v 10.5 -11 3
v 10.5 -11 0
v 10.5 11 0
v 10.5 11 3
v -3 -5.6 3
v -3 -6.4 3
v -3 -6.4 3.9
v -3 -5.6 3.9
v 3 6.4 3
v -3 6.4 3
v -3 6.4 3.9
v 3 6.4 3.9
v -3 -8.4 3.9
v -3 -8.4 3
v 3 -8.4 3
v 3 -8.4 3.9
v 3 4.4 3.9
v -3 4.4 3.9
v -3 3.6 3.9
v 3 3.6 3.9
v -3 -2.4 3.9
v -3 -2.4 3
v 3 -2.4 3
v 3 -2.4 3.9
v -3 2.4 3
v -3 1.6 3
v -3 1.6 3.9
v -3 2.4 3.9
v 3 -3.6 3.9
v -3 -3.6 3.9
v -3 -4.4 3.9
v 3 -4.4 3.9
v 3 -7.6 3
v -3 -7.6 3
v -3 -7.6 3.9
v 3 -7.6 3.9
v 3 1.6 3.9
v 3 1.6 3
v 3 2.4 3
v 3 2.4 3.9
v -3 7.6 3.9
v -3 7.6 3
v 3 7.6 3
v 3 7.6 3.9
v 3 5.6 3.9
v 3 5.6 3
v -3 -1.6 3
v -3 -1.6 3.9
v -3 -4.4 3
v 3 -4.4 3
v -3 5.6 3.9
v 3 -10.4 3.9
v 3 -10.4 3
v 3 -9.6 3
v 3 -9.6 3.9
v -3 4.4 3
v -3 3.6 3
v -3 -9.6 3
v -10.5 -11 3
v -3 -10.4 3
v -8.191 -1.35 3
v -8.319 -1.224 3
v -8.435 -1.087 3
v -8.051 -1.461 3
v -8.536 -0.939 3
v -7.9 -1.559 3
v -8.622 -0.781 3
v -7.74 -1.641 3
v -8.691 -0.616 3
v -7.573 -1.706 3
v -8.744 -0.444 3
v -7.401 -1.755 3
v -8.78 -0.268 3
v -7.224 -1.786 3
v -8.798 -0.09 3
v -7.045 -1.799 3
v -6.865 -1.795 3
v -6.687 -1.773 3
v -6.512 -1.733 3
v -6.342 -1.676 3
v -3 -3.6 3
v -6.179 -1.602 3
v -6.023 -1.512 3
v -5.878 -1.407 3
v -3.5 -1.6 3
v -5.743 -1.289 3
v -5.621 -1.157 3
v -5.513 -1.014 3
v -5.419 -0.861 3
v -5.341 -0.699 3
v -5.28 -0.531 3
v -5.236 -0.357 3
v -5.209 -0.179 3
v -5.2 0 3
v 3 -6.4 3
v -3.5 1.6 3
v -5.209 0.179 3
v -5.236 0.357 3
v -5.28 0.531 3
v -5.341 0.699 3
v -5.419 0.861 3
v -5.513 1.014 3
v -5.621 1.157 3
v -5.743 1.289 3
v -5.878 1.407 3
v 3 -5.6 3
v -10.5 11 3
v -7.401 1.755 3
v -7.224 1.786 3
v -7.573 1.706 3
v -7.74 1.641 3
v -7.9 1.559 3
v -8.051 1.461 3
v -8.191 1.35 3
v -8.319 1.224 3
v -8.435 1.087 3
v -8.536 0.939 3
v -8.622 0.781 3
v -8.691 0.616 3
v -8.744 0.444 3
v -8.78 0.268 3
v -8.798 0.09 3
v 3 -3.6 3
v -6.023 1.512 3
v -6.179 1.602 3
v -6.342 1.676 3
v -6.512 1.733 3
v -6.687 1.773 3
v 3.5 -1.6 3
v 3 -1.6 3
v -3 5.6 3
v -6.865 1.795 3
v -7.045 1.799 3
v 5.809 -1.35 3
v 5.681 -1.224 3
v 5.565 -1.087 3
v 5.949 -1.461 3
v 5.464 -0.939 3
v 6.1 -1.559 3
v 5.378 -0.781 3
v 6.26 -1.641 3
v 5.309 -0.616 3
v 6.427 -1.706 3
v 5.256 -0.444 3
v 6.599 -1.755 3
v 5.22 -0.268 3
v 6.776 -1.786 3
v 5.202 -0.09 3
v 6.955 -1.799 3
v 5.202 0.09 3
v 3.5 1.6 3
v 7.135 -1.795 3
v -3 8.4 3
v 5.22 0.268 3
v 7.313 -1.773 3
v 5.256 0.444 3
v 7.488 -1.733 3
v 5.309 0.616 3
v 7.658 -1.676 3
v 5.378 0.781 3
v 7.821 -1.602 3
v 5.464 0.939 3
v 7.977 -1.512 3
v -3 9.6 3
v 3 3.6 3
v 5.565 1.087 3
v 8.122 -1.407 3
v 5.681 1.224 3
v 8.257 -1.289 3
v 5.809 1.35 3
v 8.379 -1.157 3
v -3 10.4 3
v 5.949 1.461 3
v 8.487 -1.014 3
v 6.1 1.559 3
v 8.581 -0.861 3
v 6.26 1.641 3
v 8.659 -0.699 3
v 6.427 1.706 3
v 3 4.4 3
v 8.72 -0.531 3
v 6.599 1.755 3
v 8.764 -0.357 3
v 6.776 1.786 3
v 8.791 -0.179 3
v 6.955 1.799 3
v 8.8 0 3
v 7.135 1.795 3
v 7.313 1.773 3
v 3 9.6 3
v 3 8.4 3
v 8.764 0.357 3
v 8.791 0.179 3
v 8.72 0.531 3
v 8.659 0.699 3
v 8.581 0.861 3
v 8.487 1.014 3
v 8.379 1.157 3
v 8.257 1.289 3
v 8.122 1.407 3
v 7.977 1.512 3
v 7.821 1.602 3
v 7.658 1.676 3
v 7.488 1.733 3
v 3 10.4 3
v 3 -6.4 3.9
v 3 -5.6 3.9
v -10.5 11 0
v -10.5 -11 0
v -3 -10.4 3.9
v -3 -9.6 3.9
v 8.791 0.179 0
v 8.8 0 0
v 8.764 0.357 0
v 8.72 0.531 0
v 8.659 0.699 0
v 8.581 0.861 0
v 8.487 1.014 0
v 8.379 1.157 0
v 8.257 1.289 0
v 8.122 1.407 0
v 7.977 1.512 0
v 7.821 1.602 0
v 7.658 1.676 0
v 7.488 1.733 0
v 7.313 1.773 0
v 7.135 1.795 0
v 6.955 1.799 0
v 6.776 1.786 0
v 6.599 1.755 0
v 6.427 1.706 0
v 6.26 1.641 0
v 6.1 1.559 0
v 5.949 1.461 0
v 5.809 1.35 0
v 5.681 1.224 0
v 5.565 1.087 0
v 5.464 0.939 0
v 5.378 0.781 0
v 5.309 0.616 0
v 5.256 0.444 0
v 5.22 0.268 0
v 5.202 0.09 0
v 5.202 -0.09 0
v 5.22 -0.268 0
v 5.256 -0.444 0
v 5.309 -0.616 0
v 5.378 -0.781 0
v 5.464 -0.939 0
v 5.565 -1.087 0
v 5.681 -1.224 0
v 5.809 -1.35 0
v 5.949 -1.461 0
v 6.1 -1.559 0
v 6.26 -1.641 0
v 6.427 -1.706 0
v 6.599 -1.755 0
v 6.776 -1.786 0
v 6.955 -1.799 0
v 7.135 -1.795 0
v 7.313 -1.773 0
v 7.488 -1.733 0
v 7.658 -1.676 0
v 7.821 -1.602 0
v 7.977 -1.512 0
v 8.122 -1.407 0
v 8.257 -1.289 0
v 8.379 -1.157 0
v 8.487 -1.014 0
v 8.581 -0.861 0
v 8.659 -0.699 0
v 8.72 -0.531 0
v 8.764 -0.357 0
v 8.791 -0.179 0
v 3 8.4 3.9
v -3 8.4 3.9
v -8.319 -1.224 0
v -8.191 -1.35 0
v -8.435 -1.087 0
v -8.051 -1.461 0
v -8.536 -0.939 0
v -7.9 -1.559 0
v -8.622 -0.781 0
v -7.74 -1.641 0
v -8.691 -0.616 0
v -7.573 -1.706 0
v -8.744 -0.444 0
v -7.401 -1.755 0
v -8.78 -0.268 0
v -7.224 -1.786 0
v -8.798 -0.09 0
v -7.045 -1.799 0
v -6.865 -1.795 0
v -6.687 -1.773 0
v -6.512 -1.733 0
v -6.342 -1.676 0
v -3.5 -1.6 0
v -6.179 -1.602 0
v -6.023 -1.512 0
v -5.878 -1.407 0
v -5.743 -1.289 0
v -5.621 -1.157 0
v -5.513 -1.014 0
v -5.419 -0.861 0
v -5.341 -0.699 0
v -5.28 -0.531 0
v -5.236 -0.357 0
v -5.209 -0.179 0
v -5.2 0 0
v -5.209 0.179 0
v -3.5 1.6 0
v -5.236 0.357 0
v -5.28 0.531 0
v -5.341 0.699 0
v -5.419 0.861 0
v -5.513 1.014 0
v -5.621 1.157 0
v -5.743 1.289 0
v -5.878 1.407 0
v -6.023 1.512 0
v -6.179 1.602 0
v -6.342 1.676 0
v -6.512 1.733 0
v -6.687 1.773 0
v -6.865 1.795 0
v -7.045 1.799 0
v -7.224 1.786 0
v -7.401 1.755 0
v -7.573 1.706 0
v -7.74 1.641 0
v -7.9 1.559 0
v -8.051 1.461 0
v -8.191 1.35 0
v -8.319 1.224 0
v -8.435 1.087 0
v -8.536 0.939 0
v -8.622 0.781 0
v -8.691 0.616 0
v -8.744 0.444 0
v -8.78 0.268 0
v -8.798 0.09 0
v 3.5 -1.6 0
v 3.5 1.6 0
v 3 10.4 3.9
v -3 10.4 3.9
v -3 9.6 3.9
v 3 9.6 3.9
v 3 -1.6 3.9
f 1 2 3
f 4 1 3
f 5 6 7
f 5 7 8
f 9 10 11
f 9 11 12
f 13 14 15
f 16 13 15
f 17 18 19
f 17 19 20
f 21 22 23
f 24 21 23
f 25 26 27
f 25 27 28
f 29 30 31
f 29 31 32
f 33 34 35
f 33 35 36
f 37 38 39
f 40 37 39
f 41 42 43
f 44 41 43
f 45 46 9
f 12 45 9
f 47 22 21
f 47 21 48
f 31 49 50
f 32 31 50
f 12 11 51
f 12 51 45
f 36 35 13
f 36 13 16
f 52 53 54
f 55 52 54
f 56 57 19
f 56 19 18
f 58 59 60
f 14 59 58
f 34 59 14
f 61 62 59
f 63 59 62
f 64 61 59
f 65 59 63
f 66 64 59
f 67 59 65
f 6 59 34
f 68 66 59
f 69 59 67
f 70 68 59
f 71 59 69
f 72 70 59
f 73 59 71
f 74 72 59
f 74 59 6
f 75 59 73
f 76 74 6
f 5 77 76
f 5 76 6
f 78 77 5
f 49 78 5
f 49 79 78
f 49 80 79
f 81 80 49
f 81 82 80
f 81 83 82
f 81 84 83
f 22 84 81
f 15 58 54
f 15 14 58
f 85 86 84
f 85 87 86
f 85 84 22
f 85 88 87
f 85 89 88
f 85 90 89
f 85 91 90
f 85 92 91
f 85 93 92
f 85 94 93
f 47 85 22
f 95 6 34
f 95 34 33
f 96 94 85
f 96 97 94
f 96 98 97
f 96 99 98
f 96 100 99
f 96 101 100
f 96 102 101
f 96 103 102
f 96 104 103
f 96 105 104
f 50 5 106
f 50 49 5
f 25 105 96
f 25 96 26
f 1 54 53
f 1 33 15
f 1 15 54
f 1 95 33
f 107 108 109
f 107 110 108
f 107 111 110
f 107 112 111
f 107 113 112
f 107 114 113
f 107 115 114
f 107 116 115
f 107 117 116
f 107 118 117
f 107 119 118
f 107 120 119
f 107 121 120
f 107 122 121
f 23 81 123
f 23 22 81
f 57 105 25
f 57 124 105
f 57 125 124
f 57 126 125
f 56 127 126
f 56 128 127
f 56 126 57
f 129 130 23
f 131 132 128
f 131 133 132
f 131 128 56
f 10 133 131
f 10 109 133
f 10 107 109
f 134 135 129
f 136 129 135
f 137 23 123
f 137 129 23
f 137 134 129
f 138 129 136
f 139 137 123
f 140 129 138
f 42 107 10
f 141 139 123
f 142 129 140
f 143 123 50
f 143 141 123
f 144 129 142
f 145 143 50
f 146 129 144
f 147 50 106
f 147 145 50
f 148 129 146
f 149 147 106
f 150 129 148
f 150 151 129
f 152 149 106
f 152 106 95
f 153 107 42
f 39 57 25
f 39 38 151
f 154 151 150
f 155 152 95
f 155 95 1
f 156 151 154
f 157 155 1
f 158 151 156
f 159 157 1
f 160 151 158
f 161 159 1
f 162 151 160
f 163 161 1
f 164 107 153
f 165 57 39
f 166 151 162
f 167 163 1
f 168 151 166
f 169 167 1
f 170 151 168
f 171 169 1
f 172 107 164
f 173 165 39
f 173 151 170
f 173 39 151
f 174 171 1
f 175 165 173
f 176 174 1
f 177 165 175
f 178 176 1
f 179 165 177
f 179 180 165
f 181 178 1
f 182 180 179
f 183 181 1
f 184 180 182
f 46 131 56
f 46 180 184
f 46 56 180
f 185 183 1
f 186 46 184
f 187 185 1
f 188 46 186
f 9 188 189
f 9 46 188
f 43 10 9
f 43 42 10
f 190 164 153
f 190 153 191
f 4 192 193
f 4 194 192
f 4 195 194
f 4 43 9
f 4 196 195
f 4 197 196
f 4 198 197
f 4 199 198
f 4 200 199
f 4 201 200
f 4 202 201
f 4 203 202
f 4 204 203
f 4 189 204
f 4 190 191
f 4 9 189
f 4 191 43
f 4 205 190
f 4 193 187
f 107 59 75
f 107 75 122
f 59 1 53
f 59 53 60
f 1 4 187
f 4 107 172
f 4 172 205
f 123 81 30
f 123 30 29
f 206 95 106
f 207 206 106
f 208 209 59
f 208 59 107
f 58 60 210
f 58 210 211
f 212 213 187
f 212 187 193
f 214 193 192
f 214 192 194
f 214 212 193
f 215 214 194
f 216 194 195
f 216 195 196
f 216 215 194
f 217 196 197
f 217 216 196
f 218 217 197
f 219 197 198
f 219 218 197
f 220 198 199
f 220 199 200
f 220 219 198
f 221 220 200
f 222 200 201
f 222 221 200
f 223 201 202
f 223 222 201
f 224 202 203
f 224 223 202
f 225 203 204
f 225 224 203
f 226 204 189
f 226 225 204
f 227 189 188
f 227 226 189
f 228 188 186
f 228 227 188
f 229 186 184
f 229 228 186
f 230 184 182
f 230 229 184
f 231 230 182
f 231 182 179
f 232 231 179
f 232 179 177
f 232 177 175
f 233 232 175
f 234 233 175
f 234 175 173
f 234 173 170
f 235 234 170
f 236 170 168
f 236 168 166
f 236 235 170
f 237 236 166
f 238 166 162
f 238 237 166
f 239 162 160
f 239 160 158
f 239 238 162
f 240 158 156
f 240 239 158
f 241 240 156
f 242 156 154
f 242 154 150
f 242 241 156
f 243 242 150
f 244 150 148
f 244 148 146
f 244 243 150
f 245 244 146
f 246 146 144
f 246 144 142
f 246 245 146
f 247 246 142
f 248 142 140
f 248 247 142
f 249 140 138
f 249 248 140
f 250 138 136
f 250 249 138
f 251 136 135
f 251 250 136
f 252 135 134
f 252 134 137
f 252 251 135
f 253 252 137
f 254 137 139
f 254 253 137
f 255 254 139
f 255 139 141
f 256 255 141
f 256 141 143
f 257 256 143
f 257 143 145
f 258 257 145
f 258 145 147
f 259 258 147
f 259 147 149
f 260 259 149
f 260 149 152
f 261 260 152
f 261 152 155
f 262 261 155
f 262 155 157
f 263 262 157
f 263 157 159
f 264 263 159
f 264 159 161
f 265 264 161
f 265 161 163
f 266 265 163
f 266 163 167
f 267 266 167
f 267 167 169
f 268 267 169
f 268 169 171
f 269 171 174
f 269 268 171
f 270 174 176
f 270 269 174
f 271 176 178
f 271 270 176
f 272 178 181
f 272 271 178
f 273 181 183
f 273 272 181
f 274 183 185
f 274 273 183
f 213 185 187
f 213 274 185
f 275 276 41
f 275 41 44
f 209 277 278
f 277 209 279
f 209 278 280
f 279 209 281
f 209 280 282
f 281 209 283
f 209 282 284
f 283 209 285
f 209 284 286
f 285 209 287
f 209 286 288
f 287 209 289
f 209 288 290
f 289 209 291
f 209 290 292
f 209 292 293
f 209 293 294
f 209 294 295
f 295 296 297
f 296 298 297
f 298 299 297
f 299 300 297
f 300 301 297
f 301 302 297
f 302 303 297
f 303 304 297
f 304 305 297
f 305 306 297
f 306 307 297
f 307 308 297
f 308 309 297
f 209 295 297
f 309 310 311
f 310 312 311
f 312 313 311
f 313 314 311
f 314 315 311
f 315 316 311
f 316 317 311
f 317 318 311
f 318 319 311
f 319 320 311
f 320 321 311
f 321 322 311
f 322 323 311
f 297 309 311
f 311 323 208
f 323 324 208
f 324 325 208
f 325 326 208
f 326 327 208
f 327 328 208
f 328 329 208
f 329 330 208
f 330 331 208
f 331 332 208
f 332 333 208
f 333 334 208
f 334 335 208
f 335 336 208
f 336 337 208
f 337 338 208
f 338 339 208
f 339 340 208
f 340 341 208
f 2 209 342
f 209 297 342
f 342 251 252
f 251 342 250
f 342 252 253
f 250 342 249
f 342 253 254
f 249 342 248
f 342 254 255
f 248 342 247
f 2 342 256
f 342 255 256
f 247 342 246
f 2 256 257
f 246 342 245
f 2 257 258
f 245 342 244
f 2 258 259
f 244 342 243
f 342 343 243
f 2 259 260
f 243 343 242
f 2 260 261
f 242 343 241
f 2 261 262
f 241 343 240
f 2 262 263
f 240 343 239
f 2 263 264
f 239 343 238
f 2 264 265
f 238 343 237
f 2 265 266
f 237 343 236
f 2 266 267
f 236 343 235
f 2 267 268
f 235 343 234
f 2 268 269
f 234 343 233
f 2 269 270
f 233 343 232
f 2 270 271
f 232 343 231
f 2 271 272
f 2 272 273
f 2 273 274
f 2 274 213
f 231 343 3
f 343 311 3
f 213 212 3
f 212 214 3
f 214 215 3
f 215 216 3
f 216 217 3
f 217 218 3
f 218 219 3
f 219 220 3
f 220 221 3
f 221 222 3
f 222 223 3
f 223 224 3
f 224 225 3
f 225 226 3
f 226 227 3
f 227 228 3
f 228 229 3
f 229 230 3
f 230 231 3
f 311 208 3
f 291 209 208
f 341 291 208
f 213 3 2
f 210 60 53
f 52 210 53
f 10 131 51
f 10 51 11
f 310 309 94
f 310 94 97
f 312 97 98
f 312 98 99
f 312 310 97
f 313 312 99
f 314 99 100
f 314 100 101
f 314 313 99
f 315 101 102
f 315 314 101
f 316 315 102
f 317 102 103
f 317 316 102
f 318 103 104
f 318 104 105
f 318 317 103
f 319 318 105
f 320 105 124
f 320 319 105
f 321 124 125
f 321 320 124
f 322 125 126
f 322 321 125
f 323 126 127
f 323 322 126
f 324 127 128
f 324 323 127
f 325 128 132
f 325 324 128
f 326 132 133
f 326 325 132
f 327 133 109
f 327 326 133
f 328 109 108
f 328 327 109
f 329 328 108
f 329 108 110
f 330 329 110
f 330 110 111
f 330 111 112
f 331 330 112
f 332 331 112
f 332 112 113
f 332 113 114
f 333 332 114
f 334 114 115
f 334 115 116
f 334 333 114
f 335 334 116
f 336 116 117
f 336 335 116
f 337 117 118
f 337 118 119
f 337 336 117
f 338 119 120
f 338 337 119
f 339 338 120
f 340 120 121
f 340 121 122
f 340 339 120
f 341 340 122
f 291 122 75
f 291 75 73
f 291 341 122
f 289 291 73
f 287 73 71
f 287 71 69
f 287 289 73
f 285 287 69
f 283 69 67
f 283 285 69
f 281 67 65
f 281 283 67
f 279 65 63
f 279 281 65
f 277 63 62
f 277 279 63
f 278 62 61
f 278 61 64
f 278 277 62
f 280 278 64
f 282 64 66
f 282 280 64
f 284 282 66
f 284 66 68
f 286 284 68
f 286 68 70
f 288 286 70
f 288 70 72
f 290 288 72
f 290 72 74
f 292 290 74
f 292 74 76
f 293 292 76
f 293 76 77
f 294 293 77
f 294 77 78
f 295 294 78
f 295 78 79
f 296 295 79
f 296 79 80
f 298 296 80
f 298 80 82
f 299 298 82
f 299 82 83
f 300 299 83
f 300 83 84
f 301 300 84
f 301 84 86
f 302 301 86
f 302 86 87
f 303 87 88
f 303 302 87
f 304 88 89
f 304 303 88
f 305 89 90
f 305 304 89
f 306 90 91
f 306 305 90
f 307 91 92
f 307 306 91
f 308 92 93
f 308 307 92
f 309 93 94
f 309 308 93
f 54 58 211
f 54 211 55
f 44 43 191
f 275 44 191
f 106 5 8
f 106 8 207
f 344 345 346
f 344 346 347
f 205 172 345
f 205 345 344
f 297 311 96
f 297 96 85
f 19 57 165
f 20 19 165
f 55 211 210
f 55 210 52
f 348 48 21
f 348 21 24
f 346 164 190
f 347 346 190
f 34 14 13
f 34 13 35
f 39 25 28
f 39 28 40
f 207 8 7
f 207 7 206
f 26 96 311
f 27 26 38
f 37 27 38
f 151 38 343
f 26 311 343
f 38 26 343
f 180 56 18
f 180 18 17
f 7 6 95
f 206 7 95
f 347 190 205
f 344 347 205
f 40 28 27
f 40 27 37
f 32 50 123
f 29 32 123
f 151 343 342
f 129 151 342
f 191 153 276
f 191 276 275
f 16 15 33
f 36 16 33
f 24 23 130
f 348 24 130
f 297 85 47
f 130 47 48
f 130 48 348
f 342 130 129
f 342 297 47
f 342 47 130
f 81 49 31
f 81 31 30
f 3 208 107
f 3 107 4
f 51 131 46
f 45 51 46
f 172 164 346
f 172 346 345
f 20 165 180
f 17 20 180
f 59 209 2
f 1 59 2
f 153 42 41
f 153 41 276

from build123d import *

# Parameters (mm, degrees)
F0_W     = 21
F0_H     = 22
F0_W_2   = 6
F0_H_2   = 0.8
F0_R     = 1.8
F1_DEPTH = 3
F2_DEPTH = 3.9
F3_W     = 7
F3_H     = 3.2
F4_DEPTH = 25


with BuildPart() as f1:
    # F0 (on Top) → F1 (new body)
    with BuildSketch(Plane.XY):
        Rectangle(F0_W, F0_H)
        with Locations((0, -10)):
            Rectangle(F0_W_2, F0_H_2, mode=Mode.SUBTRACT)
        with Locations((0, -8)):
            Rectangle(F0_W_2, F0_H_2, mode=Mode.SUBTRACT)
        with Locations((0, -6)):
            Rectangle(F0_W_2, F0_H_2, mode=Mode.SUBTRACT)
        with Locations((0, -4)):
            Rectangle(F0_W_2, F0_H_2, mode=Mode.SUBTRACT)
        with Locations((0, -2)):
            Rectangle(F0_W_2, F0_H_2, mode=Mode.SUBTRACT)
        with Locations((-7, 0)):
            Circle(F0_R, mode=Mode.SUBTRACT)
        Rectangle(F0_W_2, F0_H_2, mode=Mode.SUBTRACT)
        with Locations((0, 2)):
            Rectangle(F0_W_2, F0_H_2, mode=Mode.SUBTRACT)
        with Locations((0, 4)):
            Rectangle(F0_W_2, F0_H_2, mode=Mode.SUBTRACT)
        with Locations((7, 0)):
            Circle(F0_R, mode=Mode.SUBTRACT)
        with Locations((0, 6)):
            Rectangle(F0_W_2, F0_H_2, mode=Mode.SUBTRACT)
        with Locations((0, 8)):
            Rectangle(F0_W_2, F0_H_2, mode=Mode.SUBTRACT)
        with Locations((0, 10)):
            Rectangle(F0_W_2, F0_H_2, mode=Mode.SUBTRACT)
    extrude(amount=F1_DEPTH)

    # F0 (on Top) → F2 (join)
    with BuildSketch(Plane.XY):
        with Locations((0, 8)):
            Rectangle(F0_W_2, F0_H_2)
        with Locations((0, 6)):
            Rectangle(F0_W_2, F0_H_2)
        with Locations((0, 4)):
            Rectangle(F0_W_2, F0_H_2)
        with Locations((0, 2)):
            Rectangle(F0_W_2, F0_H_2)
        Rectangle(F0_W_2, F0_H_2)
        with Locations((0, -2)):
            Rectangle(F0_W_2, F0_H_2)
        with Locations((0, -4)):
            Rectangle(F0_W_2, F0_H_2)
        with Locations((0, -6)):
            Rectangle(F0_W_2, F0_H_2)
        with Locations((0, -8)):
            Rectangle(F0_W_2, F0_H_2)
        with Locations((0, 10)):
            Rectangle(F0_W_2, F0_H_2)
        with Locations((0, -10)):
            Rectangle(F0_W_2, F0_H_2)
    extrude(amount=F2_DEPTH)

    # F3 (on face) → F4 (cut)
    with BuildSketch(Plane(origin=(0, 0, 0), x_dir=(1, 0, 0), z_dir=(0, 0, -1))):
        Rectangle(F3_W, F3_H)
    extrude(amount=-F4_DEPTH, mode=Mode.SUBTRACT)


solid = f1.part
